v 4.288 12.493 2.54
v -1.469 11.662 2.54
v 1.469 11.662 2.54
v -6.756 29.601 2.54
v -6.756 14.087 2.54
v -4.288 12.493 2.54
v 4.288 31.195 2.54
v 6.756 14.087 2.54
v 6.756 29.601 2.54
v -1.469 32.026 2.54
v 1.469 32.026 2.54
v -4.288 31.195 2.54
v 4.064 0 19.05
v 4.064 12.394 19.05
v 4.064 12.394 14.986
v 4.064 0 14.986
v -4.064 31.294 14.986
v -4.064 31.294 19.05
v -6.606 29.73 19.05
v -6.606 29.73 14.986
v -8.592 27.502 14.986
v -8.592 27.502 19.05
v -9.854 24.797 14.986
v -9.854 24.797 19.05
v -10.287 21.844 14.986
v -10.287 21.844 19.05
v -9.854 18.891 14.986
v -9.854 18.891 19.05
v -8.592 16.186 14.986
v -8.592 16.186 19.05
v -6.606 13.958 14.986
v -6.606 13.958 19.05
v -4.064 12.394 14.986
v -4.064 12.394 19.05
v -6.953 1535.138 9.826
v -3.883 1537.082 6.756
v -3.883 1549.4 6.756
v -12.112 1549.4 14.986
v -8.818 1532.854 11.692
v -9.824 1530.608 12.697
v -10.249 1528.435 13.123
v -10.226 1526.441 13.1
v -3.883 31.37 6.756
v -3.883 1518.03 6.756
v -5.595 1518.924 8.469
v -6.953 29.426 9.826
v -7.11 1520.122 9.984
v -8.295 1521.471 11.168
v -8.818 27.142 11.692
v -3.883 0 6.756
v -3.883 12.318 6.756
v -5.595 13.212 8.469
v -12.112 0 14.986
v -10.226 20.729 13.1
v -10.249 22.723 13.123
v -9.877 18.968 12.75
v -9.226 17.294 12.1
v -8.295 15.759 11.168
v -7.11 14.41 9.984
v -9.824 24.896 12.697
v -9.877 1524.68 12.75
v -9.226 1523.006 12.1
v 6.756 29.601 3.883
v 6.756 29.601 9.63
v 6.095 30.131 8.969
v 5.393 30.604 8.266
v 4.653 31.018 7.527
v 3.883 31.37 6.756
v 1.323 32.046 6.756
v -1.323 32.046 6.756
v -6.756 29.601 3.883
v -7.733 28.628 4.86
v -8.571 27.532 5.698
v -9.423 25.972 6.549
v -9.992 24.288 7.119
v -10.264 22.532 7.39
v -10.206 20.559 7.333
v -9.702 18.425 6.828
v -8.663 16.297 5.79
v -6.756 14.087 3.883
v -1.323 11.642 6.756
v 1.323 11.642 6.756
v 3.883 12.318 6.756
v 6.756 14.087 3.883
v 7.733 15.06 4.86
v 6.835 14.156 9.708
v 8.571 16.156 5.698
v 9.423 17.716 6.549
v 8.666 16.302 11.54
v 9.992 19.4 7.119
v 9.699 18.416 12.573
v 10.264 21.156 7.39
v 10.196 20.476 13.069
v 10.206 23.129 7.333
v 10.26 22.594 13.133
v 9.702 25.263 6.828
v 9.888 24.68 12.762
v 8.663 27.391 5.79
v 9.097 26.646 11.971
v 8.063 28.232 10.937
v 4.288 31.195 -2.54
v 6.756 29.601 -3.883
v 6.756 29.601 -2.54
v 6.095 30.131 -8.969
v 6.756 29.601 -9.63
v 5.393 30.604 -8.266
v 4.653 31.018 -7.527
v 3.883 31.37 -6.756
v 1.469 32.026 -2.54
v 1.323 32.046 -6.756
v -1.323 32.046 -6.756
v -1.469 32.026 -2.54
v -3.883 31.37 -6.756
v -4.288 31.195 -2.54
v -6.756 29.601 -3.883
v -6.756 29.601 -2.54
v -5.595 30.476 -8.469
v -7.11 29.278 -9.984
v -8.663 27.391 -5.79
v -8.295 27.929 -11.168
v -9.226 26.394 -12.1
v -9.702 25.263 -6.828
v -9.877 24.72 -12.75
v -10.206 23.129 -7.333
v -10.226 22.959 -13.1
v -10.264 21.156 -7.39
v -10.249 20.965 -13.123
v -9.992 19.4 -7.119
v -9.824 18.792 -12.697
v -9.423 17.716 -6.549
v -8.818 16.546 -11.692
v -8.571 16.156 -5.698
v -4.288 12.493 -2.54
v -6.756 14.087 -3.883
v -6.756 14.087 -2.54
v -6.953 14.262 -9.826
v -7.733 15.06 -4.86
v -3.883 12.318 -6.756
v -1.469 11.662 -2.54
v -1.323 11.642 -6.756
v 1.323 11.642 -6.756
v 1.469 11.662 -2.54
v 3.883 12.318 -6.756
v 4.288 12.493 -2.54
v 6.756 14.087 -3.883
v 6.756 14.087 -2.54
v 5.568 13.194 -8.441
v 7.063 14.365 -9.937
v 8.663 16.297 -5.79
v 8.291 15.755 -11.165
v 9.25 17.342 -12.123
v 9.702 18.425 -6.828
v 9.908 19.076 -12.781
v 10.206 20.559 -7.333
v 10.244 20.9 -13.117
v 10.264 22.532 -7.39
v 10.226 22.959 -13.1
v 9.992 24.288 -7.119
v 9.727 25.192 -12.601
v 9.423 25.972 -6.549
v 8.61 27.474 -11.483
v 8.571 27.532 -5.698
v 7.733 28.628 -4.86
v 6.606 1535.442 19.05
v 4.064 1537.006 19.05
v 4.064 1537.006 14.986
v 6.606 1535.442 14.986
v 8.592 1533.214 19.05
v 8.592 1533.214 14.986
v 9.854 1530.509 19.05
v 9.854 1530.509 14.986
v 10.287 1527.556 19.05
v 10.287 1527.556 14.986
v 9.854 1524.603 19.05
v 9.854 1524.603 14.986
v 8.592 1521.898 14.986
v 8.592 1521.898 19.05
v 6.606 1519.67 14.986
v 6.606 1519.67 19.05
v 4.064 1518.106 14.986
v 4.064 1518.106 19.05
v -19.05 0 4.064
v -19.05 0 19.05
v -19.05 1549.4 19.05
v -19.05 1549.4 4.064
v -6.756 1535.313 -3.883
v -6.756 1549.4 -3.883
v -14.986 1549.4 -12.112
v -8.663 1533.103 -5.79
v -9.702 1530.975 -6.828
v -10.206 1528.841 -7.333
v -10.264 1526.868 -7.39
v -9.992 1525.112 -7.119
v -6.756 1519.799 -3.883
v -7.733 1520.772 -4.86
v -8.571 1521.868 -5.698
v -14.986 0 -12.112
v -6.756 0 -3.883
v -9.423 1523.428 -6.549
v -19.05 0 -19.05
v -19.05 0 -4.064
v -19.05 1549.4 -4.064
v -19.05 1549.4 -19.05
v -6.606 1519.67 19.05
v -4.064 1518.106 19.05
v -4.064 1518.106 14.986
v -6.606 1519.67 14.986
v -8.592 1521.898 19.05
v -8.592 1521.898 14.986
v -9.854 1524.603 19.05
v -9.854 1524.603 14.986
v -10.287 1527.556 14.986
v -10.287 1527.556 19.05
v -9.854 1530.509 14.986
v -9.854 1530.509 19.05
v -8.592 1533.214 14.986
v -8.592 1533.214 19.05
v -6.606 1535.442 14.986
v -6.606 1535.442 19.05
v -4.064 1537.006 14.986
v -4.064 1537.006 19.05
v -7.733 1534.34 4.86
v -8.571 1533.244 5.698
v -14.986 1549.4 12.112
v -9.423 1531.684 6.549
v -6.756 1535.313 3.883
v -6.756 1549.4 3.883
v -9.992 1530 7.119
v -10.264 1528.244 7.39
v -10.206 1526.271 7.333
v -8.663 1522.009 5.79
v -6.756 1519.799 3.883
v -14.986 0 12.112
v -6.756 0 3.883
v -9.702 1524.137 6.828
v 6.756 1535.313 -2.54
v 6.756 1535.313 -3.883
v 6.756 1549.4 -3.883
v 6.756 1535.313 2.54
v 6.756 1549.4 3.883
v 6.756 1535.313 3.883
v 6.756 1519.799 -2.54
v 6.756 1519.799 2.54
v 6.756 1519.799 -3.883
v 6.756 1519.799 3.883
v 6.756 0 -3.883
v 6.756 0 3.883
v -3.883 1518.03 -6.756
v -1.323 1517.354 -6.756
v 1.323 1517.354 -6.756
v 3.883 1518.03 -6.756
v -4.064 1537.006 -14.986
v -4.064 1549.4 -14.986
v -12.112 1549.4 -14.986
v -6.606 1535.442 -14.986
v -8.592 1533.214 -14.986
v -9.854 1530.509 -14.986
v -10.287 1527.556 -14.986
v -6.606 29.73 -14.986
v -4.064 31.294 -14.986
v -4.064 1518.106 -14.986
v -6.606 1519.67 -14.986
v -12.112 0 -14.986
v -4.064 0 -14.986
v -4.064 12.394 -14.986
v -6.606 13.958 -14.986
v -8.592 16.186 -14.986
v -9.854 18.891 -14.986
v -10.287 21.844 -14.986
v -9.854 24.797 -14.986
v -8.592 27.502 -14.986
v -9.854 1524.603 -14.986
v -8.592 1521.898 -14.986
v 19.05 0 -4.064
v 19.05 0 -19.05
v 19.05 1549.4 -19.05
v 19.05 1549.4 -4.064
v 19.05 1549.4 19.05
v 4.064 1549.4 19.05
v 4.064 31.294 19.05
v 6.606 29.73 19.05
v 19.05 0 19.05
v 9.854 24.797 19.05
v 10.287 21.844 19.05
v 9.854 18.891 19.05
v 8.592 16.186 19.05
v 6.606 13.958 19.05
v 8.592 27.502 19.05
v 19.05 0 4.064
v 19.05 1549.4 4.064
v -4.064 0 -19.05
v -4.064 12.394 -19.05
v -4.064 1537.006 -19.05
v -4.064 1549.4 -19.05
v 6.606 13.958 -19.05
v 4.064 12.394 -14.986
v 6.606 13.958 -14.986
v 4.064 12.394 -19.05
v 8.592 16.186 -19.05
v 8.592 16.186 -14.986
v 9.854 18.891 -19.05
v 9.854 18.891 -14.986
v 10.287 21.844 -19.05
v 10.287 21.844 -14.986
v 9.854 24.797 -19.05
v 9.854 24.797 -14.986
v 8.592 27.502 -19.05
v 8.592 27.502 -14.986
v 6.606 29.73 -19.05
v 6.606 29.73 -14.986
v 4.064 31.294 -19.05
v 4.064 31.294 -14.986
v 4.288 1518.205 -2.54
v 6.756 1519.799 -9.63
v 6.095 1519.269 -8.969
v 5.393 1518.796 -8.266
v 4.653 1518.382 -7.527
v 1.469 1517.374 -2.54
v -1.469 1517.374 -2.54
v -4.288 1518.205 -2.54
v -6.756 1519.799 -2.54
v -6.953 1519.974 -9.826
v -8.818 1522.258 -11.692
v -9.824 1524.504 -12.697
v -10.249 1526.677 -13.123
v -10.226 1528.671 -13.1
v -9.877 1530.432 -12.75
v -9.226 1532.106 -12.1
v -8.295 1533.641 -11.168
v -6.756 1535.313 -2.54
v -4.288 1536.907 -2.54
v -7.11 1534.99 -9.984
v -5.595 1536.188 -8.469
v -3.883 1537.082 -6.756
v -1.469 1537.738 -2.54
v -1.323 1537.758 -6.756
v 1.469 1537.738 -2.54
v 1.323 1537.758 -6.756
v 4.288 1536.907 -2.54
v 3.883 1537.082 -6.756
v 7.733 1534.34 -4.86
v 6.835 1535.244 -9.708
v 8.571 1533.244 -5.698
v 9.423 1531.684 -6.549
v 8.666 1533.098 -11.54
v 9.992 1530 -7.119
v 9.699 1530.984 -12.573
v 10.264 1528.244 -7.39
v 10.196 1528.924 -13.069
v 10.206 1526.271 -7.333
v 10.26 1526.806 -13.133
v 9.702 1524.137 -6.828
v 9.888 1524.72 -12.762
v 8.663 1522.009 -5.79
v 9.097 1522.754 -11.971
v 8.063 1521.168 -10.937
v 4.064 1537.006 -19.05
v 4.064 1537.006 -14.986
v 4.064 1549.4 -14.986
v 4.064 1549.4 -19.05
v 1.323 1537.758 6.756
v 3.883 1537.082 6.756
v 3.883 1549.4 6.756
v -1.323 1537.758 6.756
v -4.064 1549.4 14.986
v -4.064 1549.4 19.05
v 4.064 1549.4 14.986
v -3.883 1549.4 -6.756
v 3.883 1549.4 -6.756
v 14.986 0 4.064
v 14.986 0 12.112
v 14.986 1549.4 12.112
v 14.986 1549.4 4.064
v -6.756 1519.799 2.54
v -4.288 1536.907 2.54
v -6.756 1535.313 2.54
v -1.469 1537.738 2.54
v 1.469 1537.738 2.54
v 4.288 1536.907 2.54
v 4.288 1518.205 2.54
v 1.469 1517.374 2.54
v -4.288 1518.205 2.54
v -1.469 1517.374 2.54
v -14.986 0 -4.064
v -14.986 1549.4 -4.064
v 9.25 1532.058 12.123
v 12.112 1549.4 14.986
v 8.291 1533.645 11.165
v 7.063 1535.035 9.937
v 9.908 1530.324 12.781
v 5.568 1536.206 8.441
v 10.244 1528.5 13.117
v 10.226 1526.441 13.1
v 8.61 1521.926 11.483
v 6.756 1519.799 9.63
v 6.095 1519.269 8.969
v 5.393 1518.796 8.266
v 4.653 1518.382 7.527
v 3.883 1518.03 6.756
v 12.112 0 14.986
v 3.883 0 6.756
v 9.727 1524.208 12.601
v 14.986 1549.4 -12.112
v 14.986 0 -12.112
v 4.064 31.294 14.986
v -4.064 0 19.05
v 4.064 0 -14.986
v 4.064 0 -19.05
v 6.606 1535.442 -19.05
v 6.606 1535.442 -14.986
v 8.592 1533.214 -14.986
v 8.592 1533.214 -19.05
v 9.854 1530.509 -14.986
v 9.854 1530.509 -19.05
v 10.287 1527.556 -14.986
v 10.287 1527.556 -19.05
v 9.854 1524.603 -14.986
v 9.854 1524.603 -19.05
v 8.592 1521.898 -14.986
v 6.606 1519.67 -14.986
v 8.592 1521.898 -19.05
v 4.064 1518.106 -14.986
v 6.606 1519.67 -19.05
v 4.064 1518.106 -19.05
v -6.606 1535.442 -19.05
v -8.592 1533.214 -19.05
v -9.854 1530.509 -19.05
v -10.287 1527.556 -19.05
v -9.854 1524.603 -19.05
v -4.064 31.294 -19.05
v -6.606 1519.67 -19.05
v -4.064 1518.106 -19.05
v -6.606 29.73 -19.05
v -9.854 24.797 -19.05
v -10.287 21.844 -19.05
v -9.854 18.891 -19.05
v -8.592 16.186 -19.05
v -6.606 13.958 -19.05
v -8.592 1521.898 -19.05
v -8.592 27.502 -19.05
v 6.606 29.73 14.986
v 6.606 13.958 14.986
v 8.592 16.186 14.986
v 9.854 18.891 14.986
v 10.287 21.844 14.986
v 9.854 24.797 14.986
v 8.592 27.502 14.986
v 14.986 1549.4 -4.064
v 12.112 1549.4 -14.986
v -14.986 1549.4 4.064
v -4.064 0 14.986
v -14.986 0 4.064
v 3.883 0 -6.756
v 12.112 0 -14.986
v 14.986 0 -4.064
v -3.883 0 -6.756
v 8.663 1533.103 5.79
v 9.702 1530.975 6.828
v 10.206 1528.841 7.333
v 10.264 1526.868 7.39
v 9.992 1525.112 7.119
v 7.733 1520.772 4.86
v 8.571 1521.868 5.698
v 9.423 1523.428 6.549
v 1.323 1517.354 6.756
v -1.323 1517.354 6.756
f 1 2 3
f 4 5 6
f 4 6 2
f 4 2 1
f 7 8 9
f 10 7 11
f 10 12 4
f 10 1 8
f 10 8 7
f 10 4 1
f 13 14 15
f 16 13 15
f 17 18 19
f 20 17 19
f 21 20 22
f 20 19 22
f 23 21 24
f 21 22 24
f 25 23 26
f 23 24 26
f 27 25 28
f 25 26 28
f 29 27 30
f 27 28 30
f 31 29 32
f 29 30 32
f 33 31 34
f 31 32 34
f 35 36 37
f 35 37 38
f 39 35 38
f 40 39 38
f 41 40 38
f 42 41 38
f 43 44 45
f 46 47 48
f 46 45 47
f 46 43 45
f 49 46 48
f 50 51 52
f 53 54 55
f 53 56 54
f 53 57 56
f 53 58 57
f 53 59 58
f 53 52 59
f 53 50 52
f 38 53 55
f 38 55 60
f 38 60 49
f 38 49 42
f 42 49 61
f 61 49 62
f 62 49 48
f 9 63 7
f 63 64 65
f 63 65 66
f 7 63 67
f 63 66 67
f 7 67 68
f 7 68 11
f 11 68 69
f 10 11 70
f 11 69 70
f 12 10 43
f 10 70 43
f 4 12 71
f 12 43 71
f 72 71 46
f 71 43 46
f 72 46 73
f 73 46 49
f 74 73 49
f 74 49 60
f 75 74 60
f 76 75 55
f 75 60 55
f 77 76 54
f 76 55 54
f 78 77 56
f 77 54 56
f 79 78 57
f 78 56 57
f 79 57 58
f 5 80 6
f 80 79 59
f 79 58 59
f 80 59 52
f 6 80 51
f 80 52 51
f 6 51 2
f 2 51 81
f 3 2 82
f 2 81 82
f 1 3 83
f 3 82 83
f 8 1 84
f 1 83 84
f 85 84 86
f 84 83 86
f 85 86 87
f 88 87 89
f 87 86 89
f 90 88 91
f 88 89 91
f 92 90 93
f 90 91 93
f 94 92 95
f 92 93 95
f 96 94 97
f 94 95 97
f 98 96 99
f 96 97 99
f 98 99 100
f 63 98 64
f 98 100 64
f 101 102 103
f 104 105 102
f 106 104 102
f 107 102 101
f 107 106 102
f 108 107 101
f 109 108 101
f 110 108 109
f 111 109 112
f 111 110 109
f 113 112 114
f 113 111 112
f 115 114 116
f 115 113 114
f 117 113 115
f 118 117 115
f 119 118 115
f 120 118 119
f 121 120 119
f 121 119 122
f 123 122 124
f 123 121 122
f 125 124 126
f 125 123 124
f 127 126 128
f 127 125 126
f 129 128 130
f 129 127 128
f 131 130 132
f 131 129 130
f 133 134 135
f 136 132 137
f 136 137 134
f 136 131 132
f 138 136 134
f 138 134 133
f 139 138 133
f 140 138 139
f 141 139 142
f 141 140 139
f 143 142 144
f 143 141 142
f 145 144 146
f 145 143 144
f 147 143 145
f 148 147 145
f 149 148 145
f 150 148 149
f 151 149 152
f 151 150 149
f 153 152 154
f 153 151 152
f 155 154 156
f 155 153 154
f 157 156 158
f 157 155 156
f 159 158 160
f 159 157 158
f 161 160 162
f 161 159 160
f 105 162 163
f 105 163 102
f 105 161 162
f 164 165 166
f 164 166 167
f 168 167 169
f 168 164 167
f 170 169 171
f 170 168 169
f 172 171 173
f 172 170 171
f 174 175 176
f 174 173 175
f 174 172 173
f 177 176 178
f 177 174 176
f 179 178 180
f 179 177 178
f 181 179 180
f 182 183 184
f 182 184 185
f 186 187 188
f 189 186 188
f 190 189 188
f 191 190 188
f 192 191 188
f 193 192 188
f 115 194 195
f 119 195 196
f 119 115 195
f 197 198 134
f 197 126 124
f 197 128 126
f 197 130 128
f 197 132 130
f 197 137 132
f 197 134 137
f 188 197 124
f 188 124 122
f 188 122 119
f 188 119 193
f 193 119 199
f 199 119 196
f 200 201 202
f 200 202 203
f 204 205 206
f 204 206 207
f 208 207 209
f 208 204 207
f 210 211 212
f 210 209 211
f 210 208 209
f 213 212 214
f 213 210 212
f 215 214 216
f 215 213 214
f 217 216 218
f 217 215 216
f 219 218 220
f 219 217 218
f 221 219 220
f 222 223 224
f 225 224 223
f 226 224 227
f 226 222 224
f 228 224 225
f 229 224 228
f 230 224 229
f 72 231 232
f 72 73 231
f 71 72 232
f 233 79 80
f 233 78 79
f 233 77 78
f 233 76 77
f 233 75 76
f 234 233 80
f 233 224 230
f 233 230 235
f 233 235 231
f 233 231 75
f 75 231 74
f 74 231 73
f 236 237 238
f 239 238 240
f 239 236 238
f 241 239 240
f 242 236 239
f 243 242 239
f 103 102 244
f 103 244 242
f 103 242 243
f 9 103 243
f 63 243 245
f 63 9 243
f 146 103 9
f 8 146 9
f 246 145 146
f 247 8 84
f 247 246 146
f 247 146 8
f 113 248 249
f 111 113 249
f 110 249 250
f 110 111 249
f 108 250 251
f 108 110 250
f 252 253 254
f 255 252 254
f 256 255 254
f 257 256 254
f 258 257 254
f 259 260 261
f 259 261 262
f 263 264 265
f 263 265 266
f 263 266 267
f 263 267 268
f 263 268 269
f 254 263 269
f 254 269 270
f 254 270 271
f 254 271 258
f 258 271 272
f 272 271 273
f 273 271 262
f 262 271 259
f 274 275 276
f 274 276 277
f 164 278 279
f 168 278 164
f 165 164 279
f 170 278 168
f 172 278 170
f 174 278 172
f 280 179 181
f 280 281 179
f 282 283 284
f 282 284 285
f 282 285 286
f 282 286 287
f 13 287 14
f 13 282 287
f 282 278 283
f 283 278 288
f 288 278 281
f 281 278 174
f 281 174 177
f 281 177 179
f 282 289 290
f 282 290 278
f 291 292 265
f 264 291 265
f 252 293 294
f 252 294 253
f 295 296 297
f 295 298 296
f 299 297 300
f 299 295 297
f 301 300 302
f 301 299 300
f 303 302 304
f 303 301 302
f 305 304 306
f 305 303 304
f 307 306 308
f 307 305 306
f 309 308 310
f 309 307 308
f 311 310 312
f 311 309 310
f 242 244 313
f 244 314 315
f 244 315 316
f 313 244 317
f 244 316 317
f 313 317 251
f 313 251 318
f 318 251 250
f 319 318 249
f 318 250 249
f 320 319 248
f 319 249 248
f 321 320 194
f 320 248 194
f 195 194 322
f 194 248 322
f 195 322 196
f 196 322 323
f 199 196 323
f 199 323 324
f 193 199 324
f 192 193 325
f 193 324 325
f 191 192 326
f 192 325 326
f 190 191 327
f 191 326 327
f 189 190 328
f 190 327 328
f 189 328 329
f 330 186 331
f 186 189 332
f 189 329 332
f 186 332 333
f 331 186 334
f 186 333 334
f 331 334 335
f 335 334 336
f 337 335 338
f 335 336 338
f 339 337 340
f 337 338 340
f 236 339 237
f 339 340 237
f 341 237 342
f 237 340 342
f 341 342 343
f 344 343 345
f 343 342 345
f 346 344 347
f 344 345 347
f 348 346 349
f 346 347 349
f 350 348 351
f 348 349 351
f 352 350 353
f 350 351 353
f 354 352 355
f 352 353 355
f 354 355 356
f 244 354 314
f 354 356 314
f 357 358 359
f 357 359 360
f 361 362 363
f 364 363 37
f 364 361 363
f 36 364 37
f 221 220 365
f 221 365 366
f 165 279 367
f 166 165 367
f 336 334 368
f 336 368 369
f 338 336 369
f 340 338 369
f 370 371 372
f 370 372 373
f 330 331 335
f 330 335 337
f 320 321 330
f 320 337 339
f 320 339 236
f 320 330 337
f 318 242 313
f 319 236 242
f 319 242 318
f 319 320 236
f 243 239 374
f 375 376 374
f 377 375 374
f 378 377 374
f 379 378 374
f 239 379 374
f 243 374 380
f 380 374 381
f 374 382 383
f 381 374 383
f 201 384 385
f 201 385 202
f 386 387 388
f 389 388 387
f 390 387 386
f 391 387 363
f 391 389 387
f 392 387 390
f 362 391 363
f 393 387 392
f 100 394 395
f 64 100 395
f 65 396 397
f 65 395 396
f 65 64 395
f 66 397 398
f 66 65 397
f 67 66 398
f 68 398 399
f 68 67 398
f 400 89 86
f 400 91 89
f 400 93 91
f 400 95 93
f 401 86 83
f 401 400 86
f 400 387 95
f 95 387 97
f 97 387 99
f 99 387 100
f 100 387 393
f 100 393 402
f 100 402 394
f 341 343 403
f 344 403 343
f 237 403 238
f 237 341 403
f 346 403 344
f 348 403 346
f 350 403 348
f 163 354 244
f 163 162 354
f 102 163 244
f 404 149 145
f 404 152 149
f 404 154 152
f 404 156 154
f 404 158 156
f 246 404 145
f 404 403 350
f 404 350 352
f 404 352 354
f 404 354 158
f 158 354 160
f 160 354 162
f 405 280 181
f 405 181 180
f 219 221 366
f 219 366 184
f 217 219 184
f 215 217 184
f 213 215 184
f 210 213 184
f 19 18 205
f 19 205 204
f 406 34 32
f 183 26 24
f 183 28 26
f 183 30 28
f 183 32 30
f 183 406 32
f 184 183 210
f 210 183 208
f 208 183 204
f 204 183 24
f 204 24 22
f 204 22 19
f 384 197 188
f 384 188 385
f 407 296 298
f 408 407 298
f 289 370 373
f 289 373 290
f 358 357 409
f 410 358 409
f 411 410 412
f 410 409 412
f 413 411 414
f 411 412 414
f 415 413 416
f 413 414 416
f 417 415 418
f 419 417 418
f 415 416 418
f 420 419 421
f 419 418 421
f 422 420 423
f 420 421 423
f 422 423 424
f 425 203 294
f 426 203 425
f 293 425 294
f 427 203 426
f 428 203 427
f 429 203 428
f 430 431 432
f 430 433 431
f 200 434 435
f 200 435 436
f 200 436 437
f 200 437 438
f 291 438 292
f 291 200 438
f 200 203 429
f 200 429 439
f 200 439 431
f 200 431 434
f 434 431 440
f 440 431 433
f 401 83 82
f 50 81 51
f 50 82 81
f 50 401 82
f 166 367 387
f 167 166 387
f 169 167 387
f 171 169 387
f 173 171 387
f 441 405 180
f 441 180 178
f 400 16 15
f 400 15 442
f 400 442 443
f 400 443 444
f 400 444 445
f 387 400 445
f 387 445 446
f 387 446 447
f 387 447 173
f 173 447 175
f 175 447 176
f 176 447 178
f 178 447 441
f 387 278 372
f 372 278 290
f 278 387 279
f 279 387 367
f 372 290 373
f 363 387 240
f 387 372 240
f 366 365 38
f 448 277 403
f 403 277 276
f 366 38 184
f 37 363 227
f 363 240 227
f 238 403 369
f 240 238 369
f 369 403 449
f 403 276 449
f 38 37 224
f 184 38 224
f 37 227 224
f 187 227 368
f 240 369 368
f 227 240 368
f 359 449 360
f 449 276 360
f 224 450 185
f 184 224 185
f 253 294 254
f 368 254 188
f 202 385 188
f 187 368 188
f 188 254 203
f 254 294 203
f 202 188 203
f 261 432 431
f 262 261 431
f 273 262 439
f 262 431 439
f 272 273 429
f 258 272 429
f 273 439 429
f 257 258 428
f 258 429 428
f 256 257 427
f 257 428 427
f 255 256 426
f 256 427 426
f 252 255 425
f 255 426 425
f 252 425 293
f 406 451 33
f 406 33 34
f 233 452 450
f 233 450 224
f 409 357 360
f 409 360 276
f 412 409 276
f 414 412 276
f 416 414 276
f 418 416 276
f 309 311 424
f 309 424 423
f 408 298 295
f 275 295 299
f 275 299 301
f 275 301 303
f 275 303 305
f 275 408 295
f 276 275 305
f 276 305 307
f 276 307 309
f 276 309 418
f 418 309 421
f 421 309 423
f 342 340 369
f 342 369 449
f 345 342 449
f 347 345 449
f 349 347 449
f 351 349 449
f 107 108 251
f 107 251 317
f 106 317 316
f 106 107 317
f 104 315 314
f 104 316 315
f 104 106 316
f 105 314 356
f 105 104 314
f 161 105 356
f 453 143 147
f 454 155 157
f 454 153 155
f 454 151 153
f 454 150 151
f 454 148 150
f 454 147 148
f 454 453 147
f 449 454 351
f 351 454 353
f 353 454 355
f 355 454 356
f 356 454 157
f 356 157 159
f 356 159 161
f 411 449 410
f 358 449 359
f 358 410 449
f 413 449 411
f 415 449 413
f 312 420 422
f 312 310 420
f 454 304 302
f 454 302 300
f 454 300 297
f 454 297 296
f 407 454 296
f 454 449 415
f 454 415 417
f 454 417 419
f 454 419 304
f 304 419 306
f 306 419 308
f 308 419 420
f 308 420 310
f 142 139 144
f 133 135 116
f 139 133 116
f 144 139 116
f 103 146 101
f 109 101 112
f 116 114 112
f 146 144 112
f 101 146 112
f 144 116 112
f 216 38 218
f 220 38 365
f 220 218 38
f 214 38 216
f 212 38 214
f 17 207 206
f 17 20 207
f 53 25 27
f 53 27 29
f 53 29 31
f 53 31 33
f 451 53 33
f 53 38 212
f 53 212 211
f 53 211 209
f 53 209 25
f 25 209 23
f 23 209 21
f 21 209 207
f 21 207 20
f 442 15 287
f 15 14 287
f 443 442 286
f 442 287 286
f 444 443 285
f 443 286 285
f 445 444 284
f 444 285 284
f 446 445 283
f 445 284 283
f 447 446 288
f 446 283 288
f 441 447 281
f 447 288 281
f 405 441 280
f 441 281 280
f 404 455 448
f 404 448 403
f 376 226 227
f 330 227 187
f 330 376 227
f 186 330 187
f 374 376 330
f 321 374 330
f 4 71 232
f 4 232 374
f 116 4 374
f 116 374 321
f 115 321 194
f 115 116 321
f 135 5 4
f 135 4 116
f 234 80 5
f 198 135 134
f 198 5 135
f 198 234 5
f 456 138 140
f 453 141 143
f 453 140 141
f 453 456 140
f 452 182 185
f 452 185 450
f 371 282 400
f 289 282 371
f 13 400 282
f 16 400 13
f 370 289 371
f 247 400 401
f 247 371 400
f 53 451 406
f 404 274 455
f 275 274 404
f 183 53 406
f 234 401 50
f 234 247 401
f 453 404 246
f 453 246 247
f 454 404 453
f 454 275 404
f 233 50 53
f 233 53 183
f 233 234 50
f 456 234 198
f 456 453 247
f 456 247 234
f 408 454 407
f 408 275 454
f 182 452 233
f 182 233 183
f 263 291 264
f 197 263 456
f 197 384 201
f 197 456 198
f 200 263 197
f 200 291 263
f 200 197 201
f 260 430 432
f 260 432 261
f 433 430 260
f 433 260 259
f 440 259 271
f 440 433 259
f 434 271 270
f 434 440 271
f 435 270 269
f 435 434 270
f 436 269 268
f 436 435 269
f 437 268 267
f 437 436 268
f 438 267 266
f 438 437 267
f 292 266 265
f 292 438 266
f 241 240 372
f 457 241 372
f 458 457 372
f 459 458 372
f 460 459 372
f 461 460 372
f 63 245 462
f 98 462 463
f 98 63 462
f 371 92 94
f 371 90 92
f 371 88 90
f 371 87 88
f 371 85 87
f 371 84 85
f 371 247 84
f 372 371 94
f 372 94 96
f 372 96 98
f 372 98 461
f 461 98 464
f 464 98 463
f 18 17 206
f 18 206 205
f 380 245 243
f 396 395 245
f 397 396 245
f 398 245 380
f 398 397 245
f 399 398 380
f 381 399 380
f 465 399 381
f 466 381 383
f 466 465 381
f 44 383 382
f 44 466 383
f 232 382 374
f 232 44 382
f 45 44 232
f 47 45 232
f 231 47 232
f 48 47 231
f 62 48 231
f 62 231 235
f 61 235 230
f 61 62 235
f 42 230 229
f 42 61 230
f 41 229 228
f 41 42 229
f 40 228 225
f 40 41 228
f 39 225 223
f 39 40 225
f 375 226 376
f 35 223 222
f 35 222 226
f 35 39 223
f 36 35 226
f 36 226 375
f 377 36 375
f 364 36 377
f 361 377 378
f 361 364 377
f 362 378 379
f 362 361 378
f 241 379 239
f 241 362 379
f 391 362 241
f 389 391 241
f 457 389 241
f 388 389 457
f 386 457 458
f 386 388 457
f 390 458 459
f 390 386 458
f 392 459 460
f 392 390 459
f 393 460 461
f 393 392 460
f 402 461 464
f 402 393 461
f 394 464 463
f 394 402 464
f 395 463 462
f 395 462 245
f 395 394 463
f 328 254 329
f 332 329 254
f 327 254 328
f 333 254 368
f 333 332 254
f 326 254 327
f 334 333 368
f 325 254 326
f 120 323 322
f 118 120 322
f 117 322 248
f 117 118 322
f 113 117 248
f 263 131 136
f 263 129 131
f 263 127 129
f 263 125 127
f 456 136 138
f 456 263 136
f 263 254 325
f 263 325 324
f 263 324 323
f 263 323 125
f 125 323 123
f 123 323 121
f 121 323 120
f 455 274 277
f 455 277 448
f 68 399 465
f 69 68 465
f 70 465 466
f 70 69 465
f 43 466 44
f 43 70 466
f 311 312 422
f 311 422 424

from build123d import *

# Parameters (mm, degrees)
BOSS_EXTRUDE1_DEPTH     = 1549.4
SKETCH3_R               = 10.287
CUT_EXTRUDE1_DEPTH      = 16.51
MIRROR2_COPY_1_SKETCH_R = 10.287
MIRROR2_COPY_1_DEPTH    = 16.51


with BuildPart() as part:
    # Sketch2 → Boss-Extrude1 (new body)
    with BuildSketch(Plane(origin=(0.594697292, 0, 0.594697292), x_dir=(1, 0, 0), z_dir=(0, 1, 0))):
        Polygon((-19.644697292, 19.644697292), (-4.658697292, 19.644697292), (-4.658697292, 15.580697292), (-12.707015333, 15.580697292), (-4.477415333, 7.351097292), (3.288020749, 7.351097292), (11.517620749, 15.580697292), (3.469302708, 15.580697292), (3.469302708, 19.644697292), (18.455302708, 19.644697292), (18.455302708, 4.658697292), (14.391302708, 4.658697292), (14.391302708, 12.707015333), (6.161702708, 4.477415333), (6.161702708, -3.288020749), (14.391302708, -11.517620749), (14.391302708, -3.469302708), (18.455302708, -3.469302708), (18.455302708, -18.455302708), (3.469302708, -18.455302708), (3.469302708, -14.391302708), (11.517620749, -14.391302708), (3.288020749, -6.161702708), (-4.477415333, -6.161702708), (-12.707015333, -14.391302708), (-4.658697292, -14.391302708), (-4.658697292, -18.455302708), (-19.644697292, -18.455302708), (-19.644697292, -3.469302708), (-15.580697292, -3.469302708), (-15.580697292, -11.517620749), (-7.351097292, -3.288020749), (-7.351097292, 4.477415333), (-15.580697292, 12.707015333), (-15.580697292, 4.658697292), (-19.644697292, 4.658697292), align=None)
    extrude(amount=BOSS_EXTRUDE1_DEPTH)

    # Sketch3 → Cut-Extrude1 (cut)
    with BuildSketch(Plane.XY.offset(19.05)):
        with Locations(Location((0, 21.844, 0), (0, 0, 48.944473627))):
            Circle(SKETCH3_R)
    cut_extrude1 = extrude(amount=-CUT_EXTRUDE1_DEPTH, mode=Mode.SUBTRACT)

    # Mirror1: Cut-Extrude1 across plane
    add(cut_extrude1.mirror(Plane.XY), mode=Mode.SUBTRACT)

    # Mirror2: Cut-Extrude1 across plane
    add(cut_extrude1.mirror(Plane(origin=(0, 774.7, 0), x_dir=(0, 0, 1), z_dir=(0, -1, 0))), mode=Mode.SUBTRACT)

    # Mirror2 copy 1 sketch → Mirror2 copy 1 (cut)
    with BuildSketch(Plane(origin=(0, 1549.4, -19.05), x_dir=(1, 0, 0), z_dir=(0, 0, -1))):
        with Locations(Location((0, 21.844, 0), (0, 0, 48.944473627))):
            Circle(MIRROR2_COPY_1_SKETCH_R)
    extrude(amount=-MIRROR2_COPY_1_DEPTH, mode=Mode.SUBTRACT)


solid = part.part
